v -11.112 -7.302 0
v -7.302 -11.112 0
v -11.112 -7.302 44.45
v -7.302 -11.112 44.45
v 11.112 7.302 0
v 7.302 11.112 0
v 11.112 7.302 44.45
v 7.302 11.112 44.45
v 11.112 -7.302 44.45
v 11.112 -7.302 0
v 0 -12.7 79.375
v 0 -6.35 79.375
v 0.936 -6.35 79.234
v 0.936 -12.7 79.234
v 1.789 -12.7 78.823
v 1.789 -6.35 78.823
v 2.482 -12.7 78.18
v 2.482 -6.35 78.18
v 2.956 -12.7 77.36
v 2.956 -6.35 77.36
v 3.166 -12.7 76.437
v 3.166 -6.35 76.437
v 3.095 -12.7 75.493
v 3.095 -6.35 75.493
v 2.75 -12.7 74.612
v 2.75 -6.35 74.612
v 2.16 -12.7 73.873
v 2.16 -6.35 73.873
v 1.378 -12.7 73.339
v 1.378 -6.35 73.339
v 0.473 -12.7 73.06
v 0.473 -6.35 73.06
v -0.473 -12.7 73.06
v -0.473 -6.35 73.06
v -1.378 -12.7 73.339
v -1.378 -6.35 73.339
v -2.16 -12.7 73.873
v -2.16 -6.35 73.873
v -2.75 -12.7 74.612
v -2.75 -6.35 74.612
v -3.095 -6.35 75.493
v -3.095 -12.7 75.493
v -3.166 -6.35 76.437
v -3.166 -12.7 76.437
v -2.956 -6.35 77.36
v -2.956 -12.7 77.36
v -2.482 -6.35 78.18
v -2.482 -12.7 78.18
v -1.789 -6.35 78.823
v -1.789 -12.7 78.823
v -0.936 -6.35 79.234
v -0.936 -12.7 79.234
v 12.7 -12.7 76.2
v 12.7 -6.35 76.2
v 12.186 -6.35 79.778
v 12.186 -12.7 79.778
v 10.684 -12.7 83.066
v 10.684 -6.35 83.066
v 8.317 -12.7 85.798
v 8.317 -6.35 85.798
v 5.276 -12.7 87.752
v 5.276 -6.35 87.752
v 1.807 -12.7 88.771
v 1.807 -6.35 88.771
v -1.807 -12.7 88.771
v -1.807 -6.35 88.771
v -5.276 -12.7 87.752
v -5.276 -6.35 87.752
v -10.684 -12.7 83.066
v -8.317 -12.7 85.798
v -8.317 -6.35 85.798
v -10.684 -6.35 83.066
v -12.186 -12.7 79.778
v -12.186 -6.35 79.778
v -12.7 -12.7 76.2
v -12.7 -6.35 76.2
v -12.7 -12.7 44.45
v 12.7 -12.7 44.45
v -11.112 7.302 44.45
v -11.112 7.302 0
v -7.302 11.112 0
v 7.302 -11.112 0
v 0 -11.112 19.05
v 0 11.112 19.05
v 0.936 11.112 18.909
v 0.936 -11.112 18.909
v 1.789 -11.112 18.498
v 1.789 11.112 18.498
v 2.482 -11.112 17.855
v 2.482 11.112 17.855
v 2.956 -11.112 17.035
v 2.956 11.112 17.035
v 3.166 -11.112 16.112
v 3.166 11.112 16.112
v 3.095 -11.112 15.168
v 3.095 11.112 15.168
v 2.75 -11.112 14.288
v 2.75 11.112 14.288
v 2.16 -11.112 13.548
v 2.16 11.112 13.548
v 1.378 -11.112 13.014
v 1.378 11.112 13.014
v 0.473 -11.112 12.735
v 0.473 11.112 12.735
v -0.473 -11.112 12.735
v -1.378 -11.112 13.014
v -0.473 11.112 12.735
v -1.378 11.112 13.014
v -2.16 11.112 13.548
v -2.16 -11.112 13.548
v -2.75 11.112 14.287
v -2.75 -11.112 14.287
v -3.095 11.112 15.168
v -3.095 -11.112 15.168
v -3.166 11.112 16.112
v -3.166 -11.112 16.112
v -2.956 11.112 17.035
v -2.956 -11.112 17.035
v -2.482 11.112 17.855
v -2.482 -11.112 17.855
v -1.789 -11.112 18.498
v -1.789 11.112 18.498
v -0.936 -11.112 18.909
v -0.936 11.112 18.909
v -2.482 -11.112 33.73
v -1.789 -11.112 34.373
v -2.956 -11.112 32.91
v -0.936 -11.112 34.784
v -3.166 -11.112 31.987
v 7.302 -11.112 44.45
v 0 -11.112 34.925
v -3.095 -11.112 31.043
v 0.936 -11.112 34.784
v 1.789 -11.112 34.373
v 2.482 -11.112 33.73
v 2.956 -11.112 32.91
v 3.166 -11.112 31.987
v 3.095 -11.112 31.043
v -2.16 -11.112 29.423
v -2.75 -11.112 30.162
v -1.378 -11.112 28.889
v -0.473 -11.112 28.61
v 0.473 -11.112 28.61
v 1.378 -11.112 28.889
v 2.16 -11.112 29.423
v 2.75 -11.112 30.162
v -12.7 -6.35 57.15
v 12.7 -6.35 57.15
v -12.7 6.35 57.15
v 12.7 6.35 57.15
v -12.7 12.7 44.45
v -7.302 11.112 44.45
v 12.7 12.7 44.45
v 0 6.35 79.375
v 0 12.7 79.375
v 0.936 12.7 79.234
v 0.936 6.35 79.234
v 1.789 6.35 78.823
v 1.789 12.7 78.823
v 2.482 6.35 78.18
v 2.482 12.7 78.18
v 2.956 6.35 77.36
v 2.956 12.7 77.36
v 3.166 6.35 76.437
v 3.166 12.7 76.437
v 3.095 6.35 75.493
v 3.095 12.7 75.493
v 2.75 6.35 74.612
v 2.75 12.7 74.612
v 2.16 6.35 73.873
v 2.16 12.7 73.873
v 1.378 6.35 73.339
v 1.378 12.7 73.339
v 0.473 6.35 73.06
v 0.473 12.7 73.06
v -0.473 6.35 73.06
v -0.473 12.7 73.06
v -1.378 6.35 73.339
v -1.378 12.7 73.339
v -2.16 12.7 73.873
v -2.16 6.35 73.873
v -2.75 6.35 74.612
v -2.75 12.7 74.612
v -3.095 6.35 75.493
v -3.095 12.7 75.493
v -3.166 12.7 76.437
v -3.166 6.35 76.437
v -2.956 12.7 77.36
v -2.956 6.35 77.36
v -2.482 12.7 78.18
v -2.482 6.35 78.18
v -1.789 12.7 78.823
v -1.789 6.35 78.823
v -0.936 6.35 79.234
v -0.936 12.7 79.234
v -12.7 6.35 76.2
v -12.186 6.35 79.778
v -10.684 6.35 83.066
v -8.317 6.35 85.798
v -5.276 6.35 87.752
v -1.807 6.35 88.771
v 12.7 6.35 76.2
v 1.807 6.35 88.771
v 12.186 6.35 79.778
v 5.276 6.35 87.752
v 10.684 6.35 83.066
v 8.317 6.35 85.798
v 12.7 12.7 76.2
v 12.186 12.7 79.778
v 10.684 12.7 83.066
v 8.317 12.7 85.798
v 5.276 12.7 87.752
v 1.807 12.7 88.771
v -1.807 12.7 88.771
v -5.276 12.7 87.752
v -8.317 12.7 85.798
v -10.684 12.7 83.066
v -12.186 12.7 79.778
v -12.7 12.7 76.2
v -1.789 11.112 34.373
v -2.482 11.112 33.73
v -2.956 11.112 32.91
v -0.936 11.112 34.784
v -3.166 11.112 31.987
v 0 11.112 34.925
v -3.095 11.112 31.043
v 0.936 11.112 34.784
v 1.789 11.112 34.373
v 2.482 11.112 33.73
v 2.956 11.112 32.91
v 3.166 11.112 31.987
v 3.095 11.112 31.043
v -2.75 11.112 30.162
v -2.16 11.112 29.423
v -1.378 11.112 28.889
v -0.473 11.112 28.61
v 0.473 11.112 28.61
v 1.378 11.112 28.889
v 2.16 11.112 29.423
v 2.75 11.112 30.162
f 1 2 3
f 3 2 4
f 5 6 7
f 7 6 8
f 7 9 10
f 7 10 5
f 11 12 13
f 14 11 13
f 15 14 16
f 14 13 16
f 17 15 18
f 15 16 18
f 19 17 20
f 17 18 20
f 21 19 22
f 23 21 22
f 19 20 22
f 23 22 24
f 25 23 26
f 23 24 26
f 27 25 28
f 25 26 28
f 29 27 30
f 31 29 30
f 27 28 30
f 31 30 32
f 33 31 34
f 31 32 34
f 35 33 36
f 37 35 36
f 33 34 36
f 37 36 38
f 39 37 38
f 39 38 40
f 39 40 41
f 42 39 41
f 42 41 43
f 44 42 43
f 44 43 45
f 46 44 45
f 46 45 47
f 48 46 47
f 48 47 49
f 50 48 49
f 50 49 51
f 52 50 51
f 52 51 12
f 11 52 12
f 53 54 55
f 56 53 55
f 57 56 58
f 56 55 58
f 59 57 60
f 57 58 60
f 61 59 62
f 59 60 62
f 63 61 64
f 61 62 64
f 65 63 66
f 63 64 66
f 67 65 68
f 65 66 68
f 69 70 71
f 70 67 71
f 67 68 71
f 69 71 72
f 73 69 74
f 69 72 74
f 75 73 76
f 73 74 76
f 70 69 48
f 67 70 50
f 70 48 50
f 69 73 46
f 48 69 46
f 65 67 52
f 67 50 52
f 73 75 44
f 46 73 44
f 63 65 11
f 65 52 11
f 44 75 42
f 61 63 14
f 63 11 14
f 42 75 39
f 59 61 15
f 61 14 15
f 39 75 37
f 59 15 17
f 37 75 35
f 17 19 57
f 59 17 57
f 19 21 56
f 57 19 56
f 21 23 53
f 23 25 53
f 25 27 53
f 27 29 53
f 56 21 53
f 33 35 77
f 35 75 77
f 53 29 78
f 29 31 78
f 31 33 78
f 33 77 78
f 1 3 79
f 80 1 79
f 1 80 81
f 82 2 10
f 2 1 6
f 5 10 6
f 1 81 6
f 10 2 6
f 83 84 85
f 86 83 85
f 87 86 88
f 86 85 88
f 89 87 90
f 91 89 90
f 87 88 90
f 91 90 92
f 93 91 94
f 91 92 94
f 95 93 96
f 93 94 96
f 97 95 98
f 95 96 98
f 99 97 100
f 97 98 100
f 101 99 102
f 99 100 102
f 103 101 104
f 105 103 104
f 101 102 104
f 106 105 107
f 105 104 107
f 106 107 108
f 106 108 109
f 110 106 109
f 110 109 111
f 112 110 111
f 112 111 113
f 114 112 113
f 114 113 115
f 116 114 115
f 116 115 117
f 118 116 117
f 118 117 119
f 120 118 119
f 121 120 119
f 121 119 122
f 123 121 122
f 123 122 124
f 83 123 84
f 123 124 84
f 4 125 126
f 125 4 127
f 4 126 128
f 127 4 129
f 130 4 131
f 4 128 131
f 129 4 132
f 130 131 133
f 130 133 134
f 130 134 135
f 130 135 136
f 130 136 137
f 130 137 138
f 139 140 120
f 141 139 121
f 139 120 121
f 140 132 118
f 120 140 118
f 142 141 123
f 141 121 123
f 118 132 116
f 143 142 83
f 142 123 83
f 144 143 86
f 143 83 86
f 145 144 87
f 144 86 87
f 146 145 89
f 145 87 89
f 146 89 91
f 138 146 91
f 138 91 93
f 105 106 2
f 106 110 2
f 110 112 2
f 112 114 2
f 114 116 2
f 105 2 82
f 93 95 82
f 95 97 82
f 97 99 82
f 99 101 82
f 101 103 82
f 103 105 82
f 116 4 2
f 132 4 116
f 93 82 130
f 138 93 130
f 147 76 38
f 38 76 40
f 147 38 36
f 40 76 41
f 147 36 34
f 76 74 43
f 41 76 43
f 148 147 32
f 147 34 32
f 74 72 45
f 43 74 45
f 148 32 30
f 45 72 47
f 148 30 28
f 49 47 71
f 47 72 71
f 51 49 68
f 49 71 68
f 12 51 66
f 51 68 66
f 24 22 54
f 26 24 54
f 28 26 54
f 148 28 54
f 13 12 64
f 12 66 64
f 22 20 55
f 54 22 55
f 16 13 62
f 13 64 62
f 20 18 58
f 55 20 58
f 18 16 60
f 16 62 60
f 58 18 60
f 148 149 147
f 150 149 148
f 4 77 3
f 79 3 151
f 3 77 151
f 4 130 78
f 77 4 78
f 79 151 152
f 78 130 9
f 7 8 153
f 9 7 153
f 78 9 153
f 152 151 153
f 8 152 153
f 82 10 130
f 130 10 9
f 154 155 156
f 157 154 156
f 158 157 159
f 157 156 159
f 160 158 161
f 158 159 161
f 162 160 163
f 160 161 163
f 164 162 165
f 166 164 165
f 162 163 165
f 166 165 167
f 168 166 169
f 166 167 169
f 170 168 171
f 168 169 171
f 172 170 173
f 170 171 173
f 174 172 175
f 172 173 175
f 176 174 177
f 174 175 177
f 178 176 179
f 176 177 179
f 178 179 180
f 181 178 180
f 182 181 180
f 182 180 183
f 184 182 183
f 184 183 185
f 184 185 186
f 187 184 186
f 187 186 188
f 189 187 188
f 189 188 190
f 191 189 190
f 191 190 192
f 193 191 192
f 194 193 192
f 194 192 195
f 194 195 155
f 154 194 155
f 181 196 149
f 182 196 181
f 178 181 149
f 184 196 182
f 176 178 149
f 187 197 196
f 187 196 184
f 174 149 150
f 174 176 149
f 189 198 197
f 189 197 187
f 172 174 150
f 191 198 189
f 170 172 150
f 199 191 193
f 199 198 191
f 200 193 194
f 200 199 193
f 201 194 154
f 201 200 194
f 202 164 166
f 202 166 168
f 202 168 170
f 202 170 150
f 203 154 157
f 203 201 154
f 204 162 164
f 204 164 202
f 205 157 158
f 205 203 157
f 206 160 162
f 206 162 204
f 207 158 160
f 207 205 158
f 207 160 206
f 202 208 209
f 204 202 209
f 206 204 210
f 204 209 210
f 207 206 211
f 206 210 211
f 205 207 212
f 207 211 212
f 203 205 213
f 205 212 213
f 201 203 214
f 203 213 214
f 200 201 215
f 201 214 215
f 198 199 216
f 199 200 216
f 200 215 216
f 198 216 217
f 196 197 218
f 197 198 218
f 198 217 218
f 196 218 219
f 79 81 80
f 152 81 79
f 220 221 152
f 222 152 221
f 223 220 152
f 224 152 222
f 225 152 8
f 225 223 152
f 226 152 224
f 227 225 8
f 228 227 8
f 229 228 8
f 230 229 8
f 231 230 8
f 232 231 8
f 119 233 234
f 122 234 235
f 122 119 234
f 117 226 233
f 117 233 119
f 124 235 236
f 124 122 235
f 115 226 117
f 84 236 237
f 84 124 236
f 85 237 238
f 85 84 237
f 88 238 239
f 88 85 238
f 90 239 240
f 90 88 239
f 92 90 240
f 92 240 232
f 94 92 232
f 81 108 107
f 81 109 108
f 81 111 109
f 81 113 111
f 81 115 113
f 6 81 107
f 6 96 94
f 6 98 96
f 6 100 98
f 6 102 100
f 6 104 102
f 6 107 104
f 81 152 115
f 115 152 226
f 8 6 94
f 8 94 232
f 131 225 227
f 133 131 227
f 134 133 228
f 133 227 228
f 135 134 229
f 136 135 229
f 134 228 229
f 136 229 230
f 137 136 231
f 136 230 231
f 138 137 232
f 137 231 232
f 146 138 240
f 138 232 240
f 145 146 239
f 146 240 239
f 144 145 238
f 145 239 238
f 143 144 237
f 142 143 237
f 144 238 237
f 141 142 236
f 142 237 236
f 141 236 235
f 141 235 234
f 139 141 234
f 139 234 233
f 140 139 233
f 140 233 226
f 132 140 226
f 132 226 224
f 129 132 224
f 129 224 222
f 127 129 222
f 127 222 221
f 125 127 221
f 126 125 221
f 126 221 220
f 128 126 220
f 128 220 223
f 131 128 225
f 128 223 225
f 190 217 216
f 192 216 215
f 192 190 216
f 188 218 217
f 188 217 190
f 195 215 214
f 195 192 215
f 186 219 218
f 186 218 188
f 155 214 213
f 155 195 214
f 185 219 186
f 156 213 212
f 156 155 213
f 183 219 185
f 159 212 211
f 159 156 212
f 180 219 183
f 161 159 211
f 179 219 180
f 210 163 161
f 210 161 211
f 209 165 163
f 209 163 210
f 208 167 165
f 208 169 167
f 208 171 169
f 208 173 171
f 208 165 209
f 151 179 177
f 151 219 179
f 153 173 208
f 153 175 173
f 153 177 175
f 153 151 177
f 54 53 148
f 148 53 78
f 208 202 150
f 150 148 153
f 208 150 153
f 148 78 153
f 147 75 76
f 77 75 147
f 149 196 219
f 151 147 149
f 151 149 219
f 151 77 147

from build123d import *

# Parameters (mm, degrees)
SKETCH1_W           = 22.225
SKETCH1_H           = 22.225
BOSS_EXTRUDE1_DEPTH = 44.45
CHAMFER1_SIZE       = 3.81
SKETCH2_W           = 25.4
SKETCH2_H           = 25.4
BOSS_EXTRUDE2_DEPTH = 44.45
SKETCH3_W           = 25.4
SKETCH3_H           = 12.7
CUT_EXTRUDE1_DEPTH  = 31.75
SKETCH4_R           = 3.175
CUT_EXTRUDE2_DEPTH  = 94.3255592
SKETCH5_R           = 3.175
CUT_EXTRUDE3_DEPTH  = 22.225


with BuildPart() as part:
    # Sketch1 → Boss-Extrude1 (new body)
    with BuildSketch(Plane.XY):
        Rectangle(SKETCH1_W, SKETCH1_H)
    extrude(amount=BOSS_EXTRUDE1_DEPTH)

    # Chamfer1
    chamfer1_edges = [part.edges().sort_by_distance(p)[0] for p in [
        (11.1125, -11.1125, 22.225),
        (-11.1125, -11.1125, 22.225),
        (-11.1125, 11.1125, 22.225),
        (11.1125, 11.1125, 22.225),
    ]]
    chamfer(chamfer1_edges, length=CHAMFER1_SIZE)

    # Sketch2 → Boss-Extrude2 (add)
    with BuildSketch(Plane.XY.offset(44.45)):
        Rectangle(SKETCH2_W, SKETCH2_H)
    extrude(amount=BOSS_EXTRUDE2_DEPTH)

    # Sketch3 → Cut-Extrude1 (cut)
    with BuildSketch(Plane.XY.offset(88.9)):
        Rectangle(SKETCH3_W, SKETCH3_H)
    extrude(amount=-CUT_EXTRUDE1_DEPTH, mode=Mode.SUBTRACT)

    # Sketch4 → Cut-Extrude2 (cut, through all)
    with BuildSketch(Plane(origin=(0, 12.7, 0), x_dir=(1, 0, 0), z_dir=(0, 1, 0))):
        with Locations(Location((0, -76.2, 0), (0, 0, 270))):
            Circle(SKETCH4_R)
        with BuildLine():
            Line((-12.7, -76.2), (-12.7, -95.25))
            Line((-12.7, -95.25), (12.7, -95.25))
            Line((12.7, -95.25), (12.7, -76.2))
            ThreePointArc((12.7, -76.2), (0, -88.9), (-12.7, -76.2))
        make_face()
    extrude(amount=-CUT_EXTRUDE2_DEPTH, mode=Mode.SUBTRACT)

    # Sketch5 → Cut-Extrude3 (cut)
    with BuildSketch(Plane(origin=(0, 11.1125, 0), x_dir=(1, 0, 0), z_dir=(0, 1, 0))):
        with Locations(Location((0, -31.75, 0), (0, 0, 270))):
            Circle(SKETCH5_R)
        with Locations(Location((0, -15.875, 0), (0, 0, 270))):
            Circle(SKETCH5_R)
    extrude(amount=-CUT_EXTRUDE3_DEPTH, mode=Mode.SUBTRACT)


solid = part.part
